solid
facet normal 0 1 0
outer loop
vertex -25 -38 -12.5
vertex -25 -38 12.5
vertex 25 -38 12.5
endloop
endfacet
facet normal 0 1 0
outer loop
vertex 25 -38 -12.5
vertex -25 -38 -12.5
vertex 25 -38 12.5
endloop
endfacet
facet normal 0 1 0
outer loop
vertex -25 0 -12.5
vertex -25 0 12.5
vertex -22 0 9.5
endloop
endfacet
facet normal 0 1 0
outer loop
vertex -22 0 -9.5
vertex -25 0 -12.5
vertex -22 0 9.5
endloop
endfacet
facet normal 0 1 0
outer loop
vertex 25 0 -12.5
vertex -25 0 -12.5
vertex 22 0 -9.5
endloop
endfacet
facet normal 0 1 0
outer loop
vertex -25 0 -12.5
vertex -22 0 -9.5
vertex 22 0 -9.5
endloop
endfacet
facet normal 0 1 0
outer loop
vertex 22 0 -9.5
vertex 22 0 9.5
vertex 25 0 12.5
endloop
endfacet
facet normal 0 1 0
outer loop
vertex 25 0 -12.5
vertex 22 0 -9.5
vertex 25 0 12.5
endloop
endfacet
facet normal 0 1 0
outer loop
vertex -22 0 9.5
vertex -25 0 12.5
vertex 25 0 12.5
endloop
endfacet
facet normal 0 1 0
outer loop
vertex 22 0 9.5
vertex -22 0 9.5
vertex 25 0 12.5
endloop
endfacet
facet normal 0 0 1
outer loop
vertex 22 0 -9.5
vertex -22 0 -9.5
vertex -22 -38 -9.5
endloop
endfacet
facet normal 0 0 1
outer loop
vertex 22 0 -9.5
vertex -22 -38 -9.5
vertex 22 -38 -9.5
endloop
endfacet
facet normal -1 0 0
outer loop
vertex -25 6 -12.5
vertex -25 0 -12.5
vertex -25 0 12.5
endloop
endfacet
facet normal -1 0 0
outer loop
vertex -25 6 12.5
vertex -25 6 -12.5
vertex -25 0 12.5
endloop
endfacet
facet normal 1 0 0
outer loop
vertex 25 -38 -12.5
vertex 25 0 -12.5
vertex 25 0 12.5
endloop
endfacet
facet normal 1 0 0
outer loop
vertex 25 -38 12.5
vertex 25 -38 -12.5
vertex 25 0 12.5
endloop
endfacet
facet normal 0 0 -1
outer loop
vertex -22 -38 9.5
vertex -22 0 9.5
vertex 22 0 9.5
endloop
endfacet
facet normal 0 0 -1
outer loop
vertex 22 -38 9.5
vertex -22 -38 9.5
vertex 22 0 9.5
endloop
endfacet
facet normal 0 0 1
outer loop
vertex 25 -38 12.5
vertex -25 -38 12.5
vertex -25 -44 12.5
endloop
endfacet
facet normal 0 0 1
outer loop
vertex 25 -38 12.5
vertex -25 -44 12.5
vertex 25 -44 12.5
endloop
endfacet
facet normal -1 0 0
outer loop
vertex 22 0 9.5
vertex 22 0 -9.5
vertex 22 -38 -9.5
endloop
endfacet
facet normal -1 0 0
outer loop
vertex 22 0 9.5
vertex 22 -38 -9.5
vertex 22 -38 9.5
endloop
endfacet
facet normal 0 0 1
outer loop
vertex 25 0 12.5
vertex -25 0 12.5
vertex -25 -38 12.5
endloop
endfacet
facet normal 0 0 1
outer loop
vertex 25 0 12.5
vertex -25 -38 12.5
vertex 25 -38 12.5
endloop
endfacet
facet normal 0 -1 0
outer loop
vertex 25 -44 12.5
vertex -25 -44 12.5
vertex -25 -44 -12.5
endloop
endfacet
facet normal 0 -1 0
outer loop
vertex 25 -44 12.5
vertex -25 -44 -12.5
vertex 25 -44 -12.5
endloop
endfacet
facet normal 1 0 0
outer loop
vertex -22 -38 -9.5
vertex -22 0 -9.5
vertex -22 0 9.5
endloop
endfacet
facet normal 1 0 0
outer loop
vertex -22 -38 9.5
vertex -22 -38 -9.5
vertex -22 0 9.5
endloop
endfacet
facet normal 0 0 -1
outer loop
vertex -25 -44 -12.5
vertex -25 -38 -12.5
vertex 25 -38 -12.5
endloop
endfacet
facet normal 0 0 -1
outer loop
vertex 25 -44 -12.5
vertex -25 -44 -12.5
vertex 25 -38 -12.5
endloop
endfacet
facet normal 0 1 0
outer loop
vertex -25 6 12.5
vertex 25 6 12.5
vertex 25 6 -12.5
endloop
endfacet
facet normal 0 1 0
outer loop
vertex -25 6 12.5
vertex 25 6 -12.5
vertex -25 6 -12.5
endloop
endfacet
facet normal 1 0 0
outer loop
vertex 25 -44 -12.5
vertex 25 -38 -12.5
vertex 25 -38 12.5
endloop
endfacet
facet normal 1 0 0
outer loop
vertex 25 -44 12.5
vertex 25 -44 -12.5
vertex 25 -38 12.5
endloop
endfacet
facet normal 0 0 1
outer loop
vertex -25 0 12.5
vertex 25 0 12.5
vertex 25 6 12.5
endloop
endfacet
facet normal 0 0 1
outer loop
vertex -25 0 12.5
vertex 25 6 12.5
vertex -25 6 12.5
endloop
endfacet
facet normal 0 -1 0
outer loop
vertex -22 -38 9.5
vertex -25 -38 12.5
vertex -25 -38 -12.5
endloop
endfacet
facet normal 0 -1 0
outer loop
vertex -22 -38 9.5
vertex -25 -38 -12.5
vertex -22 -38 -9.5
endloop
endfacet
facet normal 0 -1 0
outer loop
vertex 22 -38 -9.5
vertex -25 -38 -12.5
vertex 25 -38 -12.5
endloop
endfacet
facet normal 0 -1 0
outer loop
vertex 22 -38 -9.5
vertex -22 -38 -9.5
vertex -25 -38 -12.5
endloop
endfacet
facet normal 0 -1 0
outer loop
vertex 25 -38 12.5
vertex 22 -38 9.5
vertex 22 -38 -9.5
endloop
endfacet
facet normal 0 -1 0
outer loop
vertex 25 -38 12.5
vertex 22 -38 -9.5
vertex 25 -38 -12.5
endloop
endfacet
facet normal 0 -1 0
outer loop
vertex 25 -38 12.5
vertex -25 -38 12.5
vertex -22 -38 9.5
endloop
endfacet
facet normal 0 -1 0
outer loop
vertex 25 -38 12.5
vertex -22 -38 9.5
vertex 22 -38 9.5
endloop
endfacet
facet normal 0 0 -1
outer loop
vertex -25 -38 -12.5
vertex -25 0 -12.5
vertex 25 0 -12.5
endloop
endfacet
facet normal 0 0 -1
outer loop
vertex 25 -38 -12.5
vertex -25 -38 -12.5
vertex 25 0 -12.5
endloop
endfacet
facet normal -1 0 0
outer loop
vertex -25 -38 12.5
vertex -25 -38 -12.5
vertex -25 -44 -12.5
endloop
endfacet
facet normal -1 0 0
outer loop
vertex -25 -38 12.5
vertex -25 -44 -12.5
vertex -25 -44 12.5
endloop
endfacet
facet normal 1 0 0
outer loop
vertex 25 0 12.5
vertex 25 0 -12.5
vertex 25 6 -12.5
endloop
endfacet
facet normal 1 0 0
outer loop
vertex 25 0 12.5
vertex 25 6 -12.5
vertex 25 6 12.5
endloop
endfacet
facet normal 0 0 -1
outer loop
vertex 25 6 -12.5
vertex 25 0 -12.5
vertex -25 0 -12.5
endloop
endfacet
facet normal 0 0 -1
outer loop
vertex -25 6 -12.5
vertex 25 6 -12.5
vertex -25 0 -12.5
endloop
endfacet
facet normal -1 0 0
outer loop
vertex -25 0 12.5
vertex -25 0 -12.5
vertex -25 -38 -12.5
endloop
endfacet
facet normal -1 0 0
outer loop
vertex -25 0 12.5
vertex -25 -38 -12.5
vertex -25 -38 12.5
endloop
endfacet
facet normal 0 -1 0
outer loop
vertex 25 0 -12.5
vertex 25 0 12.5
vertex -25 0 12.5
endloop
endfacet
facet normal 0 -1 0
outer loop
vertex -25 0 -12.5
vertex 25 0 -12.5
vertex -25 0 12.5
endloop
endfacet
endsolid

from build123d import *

# Parameters (mm, degrees)
F0_W     = 50
F0_H     = 25
F0_W_2   = 44
F0_H_2   = 19
F1_DEPTH = 38
F2_W     = 50
F2_H     = 25
F3_DEPTH = 6
F4_W     = 50
F4_H     = 25
F5_DEPTH = 6


with BuildPart() as f1:
    # F0 (on Front) → F1 (new body)
    with BuildSketch(Plane.XZ):
        Rectangle(F0_W, F0_H)
        Rectangle(F0_W_2, F0_H_2, mode=Mode.SUBTRACT)
    extrude(amount=F1_DEPTH)


with BuildPart() as f3:
    # F2 (on face) → F3 (new body)
    with BuildSketch(Plane(origin=(0, 0, 0), x_dir=(-1, 0, 0), z_dir=(0, 1, 0))):
        Rectangle(F2_W, F2_H)
    extrude(amount=F3_DEPTH)


with BuildPart() as f5:
    # F4 (on face) → F5 (new body)
    with BuildSketch(Plane.XZ.offset(38)):
        Rectangle(F4_W, F4_H)
    extrude(amount=F5_DEPTH)


solid = Compound([f1.part, f3.part, f5.part])
